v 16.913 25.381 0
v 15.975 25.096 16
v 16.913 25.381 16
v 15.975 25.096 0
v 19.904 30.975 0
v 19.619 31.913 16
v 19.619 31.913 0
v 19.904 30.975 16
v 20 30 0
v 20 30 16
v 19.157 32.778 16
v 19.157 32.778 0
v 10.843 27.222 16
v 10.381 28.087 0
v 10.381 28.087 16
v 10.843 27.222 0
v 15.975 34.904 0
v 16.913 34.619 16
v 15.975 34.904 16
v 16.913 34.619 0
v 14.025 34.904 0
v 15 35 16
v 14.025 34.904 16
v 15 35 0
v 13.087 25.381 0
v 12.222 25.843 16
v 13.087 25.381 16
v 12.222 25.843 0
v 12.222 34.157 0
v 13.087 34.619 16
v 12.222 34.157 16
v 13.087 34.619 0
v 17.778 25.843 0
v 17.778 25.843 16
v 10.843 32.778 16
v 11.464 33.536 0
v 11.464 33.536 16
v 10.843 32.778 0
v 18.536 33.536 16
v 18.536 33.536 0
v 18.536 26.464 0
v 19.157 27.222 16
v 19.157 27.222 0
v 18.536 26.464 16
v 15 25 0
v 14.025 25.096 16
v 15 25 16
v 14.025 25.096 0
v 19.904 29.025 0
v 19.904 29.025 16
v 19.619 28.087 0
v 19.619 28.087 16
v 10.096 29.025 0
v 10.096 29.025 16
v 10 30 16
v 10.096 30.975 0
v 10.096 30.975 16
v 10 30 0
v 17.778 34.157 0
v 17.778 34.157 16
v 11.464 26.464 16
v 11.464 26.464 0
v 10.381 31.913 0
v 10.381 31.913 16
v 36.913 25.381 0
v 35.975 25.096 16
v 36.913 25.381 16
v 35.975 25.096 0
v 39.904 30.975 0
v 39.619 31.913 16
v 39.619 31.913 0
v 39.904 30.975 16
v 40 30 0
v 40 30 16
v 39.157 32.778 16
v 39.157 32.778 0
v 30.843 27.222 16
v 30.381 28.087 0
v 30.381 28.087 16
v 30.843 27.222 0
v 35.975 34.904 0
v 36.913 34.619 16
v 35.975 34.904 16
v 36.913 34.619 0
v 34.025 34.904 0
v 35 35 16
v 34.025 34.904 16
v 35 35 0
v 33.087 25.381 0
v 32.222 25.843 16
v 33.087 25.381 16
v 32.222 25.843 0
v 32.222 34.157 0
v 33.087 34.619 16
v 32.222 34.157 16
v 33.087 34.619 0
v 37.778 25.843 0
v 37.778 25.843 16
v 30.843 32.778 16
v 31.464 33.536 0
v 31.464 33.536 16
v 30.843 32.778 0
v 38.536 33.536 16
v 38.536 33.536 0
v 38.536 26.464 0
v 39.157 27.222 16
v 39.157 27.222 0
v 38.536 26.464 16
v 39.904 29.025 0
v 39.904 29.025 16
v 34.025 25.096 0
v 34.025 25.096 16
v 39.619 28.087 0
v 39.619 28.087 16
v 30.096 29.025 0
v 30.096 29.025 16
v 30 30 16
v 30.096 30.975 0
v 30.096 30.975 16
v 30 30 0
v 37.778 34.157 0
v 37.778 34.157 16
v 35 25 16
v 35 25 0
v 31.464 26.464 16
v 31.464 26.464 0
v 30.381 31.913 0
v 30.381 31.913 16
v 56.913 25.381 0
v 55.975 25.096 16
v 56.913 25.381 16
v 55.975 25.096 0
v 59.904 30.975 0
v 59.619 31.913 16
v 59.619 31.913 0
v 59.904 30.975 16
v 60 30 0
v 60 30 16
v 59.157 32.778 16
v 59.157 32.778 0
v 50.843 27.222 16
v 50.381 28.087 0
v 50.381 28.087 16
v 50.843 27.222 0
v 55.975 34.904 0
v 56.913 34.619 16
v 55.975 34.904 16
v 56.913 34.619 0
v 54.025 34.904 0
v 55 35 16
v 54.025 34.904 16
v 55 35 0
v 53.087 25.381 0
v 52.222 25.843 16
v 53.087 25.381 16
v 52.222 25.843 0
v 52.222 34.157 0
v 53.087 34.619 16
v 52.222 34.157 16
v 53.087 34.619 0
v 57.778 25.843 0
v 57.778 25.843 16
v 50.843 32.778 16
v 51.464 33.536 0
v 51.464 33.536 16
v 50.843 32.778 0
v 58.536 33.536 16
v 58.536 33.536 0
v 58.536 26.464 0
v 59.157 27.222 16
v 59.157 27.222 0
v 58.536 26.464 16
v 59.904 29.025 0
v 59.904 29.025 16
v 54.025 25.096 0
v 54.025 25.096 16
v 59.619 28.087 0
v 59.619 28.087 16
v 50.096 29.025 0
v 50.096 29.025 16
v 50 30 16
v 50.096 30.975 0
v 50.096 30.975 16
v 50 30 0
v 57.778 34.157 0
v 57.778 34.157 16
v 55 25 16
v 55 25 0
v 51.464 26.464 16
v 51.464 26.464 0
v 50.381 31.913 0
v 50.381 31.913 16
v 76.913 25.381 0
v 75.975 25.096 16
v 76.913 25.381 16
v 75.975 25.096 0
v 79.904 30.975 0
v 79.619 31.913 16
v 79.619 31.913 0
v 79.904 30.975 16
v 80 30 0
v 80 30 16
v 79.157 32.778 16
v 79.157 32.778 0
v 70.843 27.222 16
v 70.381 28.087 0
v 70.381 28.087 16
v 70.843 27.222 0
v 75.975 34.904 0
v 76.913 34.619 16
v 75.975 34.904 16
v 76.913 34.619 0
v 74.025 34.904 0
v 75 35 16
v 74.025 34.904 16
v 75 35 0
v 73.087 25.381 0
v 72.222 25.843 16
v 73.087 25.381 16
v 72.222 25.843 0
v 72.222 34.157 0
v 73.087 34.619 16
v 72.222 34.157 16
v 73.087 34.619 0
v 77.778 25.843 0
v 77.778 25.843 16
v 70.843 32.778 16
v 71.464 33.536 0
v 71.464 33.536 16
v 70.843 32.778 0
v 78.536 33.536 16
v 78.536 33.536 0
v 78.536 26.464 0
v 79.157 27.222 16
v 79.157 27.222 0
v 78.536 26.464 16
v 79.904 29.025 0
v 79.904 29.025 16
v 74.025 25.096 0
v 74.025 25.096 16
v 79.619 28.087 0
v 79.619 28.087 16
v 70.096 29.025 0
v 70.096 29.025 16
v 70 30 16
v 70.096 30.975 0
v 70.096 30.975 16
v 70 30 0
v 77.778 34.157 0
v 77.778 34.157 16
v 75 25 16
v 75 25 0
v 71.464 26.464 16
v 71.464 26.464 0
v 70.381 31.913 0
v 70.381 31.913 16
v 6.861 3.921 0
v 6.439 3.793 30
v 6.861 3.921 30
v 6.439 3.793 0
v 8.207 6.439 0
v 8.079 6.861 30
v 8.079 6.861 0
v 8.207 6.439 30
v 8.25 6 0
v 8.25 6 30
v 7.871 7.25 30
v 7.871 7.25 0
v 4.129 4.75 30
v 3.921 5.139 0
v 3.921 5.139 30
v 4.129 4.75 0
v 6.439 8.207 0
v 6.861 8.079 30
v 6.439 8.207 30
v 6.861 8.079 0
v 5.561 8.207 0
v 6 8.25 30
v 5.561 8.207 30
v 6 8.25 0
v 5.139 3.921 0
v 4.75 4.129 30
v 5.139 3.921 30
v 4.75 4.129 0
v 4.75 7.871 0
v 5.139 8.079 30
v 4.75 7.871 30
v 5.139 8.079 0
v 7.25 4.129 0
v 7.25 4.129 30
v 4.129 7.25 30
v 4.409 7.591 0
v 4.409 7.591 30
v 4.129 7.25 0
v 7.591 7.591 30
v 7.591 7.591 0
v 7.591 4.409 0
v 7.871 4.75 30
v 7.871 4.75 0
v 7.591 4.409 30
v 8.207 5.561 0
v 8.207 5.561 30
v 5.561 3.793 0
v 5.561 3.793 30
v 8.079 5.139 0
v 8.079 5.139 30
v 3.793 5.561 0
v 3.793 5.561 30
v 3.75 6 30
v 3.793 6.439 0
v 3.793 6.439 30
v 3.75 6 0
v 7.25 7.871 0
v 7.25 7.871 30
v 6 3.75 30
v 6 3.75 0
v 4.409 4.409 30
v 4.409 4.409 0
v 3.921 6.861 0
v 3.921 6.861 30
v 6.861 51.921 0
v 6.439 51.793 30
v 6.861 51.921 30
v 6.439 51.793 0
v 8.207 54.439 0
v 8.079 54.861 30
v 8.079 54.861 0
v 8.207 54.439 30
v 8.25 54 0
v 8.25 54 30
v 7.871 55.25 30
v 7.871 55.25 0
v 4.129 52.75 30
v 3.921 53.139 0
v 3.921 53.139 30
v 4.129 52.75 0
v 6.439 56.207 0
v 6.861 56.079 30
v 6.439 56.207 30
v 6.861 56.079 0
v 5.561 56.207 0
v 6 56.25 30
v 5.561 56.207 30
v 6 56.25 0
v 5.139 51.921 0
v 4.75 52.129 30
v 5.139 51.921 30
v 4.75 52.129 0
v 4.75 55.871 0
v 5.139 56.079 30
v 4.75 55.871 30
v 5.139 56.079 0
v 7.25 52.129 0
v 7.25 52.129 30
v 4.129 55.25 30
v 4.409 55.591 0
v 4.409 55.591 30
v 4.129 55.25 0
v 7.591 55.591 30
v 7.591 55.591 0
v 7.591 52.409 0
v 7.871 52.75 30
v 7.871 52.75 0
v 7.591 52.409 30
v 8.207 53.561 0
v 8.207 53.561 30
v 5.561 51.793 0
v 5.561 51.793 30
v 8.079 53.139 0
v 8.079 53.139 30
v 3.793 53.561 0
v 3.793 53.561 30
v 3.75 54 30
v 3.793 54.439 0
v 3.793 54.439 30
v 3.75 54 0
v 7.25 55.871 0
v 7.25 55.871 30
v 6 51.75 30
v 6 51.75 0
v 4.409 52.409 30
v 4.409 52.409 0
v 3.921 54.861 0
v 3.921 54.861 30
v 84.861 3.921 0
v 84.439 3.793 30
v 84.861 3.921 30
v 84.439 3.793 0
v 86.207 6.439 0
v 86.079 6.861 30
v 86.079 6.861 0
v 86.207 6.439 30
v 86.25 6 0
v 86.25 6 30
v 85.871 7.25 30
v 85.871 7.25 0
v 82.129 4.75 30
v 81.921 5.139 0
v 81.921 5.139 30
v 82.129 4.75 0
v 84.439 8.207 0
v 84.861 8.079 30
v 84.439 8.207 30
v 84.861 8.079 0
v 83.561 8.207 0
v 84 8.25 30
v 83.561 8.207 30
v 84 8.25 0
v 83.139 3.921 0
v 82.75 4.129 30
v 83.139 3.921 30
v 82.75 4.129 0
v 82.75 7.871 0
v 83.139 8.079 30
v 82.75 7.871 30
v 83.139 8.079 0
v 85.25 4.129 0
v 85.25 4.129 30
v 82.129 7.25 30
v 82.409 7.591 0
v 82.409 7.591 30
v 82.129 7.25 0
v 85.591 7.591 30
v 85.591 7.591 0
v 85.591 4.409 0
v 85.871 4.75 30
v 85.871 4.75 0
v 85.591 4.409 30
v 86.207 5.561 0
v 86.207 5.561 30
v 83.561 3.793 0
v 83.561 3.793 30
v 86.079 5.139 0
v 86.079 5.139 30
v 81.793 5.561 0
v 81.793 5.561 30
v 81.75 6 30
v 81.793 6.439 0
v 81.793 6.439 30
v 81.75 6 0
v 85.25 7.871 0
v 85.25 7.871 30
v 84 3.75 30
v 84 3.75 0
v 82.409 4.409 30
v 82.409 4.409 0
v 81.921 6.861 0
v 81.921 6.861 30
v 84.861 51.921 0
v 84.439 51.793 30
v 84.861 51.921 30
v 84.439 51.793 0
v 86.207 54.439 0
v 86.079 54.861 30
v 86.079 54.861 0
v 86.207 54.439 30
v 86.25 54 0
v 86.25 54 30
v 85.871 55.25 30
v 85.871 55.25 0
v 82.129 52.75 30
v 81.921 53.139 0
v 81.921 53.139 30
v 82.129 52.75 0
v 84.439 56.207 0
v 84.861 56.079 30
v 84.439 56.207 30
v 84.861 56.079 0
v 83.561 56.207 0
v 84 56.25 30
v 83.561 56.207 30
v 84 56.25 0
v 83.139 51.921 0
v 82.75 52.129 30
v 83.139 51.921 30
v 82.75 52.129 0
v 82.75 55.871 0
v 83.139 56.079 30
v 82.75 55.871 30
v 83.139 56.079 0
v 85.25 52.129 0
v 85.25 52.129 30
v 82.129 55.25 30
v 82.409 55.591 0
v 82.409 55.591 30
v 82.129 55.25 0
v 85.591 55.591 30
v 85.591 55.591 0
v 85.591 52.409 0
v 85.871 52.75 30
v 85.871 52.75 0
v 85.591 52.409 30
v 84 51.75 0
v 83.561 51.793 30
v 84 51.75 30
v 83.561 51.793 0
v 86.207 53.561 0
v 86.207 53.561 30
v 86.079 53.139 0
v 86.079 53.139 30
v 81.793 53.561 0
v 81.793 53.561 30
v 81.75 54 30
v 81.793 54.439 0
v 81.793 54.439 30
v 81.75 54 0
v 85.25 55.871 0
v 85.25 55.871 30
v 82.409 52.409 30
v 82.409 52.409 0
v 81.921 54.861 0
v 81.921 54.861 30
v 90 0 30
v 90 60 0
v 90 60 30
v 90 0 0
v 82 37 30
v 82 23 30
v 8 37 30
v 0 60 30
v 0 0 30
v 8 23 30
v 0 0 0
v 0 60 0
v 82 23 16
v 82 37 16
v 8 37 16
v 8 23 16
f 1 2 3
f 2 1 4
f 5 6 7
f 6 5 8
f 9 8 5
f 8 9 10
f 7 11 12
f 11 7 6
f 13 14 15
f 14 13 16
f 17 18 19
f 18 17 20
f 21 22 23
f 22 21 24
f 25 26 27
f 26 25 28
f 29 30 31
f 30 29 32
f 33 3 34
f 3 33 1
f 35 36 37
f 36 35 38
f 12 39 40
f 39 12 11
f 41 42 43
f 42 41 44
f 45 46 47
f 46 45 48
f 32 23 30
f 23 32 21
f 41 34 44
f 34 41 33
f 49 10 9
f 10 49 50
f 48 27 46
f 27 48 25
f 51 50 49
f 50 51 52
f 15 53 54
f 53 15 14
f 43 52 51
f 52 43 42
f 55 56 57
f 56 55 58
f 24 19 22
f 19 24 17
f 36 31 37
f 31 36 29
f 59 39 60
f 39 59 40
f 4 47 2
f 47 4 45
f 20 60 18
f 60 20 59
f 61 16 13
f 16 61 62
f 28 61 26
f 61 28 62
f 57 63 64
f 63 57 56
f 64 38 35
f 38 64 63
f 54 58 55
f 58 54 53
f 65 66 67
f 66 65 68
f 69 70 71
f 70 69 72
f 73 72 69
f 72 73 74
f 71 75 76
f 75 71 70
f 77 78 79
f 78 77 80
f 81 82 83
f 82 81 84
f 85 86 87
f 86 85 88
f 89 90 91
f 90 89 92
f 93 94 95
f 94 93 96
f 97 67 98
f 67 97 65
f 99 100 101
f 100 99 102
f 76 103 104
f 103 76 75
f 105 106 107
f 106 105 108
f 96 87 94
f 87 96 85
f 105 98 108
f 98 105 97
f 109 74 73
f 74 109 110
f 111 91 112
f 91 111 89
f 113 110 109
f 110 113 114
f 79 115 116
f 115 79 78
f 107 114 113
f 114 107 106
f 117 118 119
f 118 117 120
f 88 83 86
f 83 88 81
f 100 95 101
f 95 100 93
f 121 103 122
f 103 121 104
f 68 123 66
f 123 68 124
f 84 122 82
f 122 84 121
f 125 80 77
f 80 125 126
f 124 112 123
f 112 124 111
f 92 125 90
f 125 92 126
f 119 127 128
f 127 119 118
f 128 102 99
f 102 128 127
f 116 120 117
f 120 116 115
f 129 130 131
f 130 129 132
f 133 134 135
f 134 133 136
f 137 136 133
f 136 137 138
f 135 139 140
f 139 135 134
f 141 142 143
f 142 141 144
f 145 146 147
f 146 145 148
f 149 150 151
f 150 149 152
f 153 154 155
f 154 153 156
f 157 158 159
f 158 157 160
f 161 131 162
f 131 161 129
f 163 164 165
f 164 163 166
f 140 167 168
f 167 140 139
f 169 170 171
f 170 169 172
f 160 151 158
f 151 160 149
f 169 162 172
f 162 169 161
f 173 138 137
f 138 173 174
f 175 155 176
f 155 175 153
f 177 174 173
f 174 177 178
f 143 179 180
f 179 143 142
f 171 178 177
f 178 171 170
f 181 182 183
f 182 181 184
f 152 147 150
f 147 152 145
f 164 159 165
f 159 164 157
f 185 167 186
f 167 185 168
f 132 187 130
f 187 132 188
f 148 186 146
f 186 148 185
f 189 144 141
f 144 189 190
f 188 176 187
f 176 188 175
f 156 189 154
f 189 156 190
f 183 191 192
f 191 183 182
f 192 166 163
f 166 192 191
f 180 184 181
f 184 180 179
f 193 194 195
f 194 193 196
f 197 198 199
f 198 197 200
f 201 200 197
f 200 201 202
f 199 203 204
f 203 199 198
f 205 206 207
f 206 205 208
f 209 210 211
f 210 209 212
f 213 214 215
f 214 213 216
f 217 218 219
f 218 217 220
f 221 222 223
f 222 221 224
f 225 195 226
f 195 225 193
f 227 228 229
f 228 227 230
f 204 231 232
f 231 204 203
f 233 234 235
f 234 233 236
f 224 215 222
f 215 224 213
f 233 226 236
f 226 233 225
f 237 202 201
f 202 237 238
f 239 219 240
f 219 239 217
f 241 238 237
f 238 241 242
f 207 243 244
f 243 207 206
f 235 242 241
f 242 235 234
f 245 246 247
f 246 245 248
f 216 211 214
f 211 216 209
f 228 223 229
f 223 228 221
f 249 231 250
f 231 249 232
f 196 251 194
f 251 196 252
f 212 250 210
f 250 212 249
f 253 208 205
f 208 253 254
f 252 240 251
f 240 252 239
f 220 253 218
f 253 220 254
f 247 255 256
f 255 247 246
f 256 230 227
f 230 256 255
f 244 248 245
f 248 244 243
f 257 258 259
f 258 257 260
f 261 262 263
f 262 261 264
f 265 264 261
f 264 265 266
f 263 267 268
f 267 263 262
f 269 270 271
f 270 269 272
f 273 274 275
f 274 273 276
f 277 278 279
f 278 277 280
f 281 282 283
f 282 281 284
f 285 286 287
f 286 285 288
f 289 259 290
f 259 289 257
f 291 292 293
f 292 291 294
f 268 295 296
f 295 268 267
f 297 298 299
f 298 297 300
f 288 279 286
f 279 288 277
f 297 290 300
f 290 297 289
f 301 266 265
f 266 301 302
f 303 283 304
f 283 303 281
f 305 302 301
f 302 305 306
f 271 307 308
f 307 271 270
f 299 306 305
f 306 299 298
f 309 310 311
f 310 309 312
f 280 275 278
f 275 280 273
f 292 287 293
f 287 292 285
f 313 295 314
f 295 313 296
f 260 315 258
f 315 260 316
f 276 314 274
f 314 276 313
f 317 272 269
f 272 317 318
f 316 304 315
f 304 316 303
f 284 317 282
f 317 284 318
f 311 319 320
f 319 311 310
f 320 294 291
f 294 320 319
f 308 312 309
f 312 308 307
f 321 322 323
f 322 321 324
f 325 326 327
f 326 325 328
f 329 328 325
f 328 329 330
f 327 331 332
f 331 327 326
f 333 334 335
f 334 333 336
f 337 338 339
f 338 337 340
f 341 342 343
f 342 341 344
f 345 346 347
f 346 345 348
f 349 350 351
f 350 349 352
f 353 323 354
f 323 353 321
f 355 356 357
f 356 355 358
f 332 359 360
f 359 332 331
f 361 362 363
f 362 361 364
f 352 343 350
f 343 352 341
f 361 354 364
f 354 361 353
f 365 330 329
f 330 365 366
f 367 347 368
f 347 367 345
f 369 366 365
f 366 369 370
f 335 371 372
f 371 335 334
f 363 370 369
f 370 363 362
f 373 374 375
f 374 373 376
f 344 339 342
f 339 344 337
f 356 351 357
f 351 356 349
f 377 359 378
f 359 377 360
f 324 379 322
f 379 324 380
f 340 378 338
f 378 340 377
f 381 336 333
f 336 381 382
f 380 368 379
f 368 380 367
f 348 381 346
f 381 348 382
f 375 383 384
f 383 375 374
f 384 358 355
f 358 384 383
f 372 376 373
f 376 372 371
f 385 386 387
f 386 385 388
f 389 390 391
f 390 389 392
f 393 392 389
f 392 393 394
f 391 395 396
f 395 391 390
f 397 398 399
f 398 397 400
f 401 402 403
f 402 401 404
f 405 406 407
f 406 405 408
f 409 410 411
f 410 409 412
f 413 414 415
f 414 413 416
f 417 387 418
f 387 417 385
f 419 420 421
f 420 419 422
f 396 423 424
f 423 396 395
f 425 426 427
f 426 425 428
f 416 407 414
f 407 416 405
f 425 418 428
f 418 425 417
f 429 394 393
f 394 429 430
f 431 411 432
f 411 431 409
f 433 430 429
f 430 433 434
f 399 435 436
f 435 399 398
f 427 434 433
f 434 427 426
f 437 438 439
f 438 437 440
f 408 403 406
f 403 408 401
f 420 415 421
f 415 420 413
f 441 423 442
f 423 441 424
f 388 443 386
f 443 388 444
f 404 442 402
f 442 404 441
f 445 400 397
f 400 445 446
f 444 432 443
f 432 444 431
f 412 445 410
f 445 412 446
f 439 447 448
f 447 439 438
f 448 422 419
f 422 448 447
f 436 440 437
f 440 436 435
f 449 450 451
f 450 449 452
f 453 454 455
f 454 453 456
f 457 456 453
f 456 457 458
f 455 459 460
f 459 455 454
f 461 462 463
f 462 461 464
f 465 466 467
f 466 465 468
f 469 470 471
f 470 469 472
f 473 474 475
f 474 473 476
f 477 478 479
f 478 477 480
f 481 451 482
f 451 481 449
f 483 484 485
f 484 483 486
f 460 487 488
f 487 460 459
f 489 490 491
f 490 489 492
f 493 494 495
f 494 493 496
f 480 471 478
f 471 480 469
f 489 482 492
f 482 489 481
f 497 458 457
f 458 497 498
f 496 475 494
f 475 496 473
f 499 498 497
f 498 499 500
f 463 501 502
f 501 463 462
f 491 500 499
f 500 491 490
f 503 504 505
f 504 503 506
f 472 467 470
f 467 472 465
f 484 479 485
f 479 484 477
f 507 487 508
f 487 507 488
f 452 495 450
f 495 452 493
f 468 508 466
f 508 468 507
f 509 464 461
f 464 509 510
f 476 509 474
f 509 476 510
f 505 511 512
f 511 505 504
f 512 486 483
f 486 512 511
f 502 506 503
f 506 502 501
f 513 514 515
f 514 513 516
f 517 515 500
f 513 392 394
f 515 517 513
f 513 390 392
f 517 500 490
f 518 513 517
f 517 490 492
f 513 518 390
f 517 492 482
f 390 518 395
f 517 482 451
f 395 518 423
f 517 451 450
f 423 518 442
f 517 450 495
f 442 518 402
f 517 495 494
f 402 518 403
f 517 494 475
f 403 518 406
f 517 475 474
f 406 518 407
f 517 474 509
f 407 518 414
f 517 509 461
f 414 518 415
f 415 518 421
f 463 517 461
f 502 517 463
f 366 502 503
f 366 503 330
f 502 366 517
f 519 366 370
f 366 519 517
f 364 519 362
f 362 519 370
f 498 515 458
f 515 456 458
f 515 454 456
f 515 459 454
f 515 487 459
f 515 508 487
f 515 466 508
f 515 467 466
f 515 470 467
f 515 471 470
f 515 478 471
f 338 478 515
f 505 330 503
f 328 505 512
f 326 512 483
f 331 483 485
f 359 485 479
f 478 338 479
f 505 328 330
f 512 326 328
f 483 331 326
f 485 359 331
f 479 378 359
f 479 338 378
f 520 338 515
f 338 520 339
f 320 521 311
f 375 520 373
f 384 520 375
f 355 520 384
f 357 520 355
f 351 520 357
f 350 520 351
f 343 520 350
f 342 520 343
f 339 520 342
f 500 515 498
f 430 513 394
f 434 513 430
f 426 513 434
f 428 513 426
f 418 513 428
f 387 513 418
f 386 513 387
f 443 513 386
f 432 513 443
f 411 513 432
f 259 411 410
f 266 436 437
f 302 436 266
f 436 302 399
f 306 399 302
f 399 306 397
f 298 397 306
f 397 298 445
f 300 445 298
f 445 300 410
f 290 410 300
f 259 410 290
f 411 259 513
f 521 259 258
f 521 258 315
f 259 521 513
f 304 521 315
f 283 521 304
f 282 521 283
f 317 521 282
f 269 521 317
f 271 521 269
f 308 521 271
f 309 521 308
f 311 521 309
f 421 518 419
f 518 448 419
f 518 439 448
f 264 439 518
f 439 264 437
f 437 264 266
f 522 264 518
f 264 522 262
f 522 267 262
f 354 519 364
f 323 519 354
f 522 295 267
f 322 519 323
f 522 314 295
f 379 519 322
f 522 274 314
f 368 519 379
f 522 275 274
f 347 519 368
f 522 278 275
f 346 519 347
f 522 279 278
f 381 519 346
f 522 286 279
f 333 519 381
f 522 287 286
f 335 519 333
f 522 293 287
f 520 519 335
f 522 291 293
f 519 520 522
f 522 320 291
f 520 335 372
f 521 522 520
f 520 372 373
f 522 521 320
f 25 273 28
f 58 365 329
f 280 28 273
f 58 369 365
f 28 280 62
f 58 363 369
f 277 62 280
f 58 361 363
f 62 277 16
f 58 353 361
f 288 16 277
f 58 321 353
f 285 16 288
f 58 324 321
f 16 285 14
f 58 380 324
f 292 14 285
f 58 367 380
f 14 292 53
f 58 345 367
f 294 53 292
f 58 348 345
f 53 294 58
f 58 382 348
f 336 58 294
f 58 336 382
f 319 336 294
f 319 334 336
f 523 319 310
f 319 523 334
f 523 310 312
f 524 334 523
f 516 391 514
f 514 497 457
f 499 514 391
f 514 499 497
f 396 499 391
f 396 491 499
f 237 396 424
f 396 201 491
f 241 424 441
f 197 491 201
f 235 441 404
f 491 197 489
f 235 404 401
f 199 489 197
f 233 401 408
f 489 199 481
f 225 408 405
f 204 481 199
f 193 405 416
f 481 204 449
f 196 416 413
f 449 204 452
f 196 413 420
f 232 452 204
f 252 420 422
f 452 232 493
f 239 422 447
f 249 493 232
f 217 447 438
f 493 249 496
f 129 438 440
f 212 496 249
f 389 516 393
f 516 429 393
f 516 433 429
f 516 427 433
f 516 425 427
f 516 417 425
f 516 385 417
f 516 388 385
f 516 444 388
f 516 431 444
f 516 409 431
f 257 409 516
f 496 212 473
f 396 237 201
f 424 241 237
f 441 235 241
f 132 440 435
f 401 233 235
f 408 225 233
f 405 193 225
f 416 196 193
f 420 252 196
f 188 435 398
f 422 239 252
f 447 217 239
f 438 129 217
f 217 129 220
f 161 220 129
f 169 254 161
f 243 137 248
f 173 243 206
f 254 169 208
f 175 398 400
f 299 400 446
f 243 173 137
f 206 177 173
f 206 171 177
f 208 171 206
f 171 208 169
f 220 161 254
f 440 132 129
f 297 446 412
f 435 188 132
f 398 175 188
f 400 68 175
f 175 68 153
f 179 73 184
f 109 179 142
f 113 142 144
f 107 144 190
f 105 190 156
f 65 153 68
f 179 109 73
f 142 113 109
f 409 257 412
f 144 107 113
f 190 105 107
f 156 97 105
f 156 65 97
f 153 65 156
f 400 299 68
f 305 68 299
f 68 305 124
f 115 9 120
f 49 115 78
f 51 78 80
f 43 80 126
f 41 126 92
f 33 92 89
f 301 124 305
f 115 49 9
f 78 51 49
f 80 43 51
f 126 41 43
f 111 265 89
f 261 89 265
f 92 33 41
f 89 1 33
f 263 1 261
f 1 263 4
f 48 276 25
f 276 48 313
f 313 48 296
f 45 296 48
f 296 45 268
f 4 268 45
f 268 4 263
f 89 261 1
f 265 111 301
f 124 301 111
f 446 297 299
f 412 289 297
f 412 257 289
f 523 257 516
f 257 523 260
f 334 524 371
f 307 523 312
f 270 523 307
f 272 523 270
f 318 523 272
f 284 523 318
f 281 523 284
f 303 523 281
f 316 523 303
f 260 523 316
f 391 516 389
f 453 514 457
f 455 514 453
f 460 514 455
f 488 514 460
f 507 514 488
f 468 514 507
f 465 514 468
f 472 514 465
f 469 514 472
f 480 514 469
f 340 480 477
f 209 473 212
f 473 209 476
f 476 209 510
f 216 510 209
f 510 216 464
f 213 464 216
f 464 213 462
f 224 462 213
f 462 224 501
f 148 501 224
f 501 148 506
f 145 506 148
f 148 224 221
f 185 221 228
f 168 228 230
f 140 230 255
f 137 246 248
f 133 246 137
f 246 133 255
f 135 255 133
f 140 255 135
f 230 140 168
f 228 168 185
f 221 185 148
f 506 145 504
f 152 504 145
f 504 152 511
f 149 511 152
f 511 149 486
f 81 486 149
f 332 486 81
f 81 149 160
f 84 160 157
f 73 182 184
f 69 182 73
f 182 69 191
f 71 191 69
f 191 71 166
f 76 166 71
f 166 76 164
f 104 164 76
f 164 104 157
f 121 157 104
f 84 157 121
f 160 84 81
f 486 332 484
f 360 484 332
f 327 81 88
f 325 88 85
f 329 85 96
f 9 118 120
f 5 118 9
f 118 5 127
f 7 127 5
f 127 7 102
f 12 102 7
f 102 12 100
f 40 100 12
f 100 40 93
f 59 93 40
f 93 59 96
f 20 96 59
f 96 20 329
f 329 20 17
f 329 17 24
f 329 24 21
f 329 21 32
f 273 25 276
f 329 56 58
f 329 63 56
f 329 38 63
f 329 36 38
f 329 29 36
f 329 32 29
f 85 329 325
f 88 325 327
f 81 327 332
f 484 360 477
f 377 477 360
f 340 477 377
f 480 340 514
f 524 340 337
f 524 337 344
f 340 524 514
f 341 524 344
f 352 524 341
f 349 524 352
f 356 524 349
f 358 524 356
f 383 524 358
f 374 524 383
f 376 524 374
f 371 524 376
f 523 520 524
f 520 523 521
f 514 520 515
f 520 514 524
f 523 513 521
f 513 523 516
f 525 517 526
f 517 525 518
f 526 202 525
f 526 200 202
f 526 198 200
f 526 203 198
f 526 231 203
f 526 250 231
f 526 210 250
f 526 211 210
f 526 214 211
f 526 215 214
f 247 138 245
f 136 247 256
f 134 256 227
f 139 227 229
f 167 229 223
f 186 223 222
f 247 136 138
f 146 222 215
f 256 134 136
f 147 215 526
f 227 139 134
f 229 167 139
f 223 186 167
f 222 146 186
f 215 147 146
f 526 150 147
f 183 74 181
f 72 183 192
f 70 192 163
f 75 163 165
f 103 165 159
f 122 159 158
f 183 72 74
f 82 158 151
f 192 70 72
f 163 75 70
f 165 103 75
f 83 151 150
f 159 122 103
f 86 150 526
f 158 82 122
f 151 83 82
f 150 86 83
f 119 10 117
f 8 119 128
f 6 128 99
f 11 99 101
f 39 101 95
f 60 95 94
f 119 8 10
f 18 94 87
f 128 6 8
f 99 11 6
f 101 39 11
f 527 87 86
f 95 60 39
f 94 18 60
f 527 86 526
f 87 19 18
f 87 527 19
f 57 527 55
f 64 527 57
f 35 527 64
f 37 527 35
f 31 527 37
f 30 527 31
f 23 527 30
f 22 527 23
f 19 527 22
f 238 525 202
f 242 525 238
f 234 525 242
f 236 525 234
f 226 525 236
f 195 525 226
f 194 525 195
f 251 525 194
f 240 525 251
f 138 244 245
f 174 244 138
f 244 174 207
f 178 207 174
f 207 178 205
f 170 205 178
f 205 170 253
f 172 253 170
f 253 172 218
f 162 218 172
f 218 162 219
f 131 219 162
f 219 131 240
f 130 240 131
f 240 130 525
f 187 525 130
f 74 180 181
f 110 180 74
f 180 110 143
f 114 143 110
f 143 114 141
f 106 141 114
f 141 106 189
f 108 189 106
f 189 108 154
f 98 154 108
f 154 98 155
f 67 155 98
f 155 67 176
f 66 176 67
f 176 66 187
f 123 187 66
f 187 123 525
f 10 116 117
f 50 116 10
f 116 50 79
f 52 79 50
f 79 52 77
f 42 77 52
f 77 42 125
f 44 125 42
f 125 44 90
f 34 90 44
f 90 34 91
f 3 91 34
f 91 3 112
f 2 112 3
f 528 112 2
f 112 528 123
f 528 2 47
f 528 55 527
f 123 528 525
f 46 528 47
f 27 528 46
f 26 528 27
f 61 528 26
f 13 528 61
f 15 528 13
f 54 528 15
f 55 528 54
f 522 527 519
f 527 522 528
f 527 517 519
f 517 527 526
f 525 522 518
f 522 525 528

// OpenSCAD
$fn = 32;

// ----------------------------------------------------------------------
// Manifold block: gallery_top manifold
// ----------------------------------------------------------------------

// --- parameters (mm) ---
block_l = 90;             // block length, X
block_w = 60;             // block width, Y
block_h = 30;             // block height, Z
port_d = 10;              // port bore diameter
port_pitch = 20;          // port pitch along X
gallery_d = 14;           // top gallery width, Y
gallery_depth = 14;       // gallery pocket depth
wall_p = 8;               // gallery end wall thickness, X
mnt_d = 4.5;              // mounting hole diameter
mnt_in = 6;               // mounting hole inset from the edges

n_ports = 4;  // ports in the row
port_x0 = (block_l - (n_ports - 1) * port_pitch) / 2;  // first port X

difference() {
  cube([block_l, block_w, block_h]);
  for (i = [0 : n_ports - 1])
    translate([port_x0 + i * port_pitch, block_w / 2, -1])
      cylinder(h = block_h + 2, d = port_d);
  translate([wall_p, block_w / 2 - gallery_d / 2, block_h - gallery_depth])
    cube([block_l - 2 * wall_p, gallery_d, gallery_depth + 1]);
  for (cx = [mnt_in, block_l - mnt_in])
    for (cy = [mnt_in, block_w - mnt_in])
      translate([cx, cy, -1]) cylinder(h = block_h + 2, d = mnt_d);
}
